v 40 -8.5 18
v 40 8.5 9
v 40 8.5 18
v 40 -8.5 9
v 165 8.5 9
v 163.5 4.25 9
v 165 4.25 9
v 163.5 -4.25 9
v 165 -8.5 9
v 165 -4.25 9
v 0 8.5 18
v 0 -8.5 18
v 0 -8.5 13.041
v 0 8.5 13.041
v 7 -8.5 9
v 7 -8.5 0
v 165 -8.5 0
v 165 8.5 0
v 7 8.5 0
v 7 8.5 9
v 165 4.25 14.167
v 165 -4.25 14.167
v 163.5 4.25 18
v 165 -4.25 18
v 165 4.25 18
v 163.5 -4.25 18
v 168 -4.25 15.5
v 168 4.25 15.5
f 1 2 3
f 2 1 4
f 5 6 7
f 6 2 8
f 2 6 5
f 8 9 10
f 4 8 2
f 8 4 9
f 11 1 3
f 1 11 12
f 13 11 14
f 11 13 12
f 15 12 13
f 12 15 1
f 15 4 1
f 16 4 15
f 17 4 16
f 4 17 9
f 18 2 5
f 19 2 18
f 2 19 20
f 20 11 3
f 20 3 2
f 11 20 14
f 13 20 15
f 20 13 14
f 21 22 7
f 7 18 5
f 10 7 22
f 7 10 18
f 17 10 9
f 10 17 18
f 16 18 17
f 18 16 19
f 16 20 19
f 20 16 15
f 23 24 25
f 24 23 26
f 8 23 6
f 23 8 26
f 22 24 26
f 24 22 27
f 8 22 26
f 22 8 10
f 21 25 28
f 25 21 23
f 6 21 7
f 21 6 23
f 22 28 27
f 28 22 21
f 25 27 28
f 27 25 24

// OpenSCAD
union() {
	translate(v = [0, 0, 18]) {
		rotate(a = 180, v = [1, 0, 0]) {
			difference() {
				translate(v = [0, -8.5000000000, 0]) {
					cube(size = [40, 17, 9]);
				}
				translate(v = [7, -10, 9]) {
					rotate(a = 150, v = [0, 1, 0]) {
						translate(v = [0, 0, -5]) {
							cube(size = [20, 20, 5]);
						}
					}
				}
			}
			translate(v = [7, -8.5000000000, 9]) {
				cube(size = [158, 17, 9]);
			}
			translate(v = [163.5000000000, -4.2500000000, 0]) {
				cube(size = [1.5000000000, 8.5000000000, 9]);
			}
			translate(v = [163.5000000000, -4.2500000000, 4.5000000000]) {
				rotate(a = -90, v = [1, 0, 0]) {
					linear_extrude(height = 8.5000000000) {
						polygon(paths = [[0, 1, 2, 3]], points = [[0, 0], [4.5000000000, 2], [1.5000000000, 4.5000000000], [0, 4.5000000000]]);
					}
				}
			}
		}
	}
}
